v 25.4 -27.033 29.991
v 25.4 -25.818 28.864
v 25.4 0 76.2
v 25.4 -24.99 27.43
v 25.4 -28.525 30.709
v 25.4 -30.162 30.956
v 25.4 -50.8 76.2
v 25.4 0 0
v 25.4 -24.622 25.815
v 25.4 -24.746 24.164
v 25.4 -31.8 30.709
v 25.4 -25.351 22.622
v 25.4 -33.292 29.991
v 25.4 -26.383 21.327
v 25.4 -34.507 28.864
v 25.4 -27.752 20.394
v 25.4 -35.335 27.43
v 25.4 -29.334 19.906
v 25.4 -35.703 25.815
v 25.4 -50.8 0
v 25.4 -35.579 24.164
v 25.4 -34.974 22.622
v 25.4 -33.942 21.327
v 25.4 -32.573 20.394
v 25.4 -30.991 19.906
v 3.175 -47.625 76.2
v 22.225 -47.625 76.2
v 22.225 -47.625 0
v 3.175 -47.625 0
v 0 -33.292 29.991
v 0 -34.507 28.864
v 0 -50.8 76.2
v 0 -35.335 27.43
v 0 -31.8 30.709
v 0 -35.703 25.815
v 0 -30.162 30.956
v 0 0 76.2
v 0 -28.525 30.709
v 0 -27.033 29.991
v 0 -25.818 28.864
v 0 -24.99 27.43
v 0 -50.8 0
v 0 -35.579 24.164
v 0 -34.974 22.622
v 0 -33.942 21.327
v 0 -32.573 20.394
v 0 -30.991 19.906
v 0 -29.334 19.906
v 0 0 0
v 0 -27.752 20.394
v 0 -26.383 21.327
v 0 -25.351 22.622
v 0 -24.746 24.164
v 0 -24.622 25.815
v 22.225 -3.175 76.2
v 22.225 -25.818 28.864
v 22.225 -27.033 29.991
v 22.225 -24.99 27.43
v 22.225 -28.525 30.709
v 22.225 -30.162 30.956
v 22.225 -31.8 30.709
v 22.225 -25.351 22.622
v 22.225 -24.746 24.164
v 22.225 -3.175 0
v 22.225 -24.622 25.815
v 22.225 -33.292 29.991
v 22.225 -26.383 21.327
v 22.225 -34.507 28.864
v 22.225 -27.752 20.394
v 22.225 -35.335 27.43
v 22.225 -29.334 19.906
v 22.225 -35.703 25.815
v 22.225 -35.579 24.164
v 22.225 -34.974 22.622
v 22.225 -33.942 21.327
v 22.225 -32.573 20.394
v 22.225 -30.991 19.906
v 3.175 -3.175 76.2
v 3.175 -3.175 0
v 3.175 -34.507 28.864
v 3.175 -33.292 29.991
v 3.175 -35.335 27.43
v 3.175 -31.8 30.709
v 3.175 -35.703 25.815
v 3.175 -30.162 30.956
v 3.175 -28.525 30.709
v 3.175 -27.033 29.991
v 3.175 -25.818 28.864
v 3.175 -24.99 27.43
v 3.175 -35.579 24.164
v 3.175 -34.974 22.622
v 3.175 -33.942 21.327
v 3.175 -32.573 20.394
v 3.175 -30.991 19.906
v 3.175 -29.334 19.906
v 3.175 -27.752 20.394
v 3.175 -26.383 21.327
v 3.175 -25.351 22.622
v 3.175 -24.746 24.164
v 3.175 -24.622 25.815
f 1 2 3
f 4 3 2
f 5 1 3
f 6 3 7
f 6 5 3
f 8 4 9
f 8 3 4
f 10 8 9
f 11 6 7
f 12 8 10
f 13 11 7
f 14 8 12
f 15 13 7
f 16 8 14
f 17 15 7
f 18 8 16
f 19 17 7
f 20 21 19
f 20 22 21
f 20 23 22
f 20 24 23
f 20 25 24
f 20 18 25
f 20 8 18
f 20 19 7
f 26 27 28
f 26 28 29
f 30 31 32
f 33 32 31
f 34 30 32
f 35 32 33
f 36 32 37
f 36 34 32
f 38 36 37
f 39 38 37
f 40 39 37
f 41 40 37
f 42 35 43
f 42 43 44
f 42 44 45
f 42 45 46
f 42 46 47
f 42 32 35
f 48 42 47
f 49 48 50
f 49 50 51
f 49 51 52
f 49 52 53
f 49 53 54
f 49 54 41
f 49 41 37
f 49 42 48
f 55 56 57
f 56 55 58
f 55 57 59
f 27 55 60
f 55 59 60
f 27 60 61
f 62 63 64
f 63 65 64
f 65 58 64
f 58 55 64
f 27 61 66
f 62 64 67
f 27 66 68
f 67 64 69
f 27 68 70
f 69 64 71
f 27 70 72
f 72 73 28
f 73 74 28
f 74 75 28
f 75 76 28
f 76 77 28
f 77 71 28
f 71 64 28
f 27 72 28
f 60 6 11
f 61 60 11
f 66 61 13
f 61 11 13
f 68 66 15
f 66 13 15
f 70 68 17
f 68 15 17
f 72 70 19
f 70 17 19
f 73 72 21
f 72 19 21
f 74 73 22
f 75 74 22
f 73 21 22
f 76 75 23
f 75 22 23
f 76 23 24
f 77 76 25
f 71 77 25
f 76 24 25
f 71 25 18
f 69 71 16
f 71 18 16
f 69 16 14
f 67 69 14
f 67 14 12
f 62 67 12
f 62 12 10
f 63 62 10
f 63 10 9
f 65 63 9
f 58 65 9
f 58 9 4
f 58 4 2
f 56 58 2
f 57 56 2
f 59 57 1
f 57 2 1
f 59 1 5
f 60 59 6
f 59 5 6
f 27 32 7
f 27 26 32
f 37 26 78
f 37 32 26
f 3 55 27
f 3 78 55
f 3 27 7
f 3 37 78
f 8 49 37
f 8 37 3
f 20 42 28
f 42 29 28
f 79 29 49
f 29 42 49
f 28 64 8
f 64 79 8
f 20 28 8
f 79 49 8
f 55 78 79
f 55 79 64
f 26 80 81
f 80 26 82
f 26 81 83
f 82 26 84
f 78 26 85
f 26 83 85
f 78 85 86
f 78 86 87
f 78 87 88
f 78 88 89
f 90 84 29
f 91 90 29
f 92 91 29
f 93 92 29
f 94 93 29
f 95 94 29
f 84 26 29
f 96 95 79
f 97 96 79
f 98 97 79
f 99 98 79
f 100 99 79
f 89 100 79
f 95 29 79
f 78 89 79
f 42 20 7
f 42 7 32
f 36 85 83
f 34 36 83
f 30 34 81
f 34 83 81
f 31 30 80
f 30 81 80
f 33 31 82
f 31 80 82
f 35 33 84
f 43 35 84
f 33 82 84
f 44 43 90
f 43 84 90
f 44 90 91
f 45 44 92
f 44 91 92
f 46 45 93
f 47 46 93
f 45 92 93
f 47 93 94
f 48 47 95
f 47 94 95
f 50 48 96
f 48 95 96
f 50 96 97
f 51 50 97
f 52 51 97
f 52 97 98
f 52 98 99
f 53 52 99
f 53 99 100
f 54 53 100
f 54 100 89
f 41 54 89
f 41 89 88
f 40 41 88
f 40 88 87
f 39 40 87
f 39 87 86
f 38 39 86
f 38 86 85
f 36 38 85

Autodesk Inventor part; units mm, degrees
ref_plane "YZ Plane" through (0, 0, 0) normal (1, 0, 0) x (0, 1, 0)
ref_plane "XZ Plane" through (0, 0, 0) normal (0, 1, 0) x (-1, 0, 0)
ref_plane "XY Plane" through (0, 0, 0) normal (0, 0, 1) x (1, 0, 0)
sketch "Sketch1" plane through (0, 0, 0) normal (0, 0, 1) x (1, 0, 0)
  line L0 (0, 0) -> (25.4, 0)
  line L1 (25.4, 0) -> (25.4, -50.8)
  line L2 (25.4, -50.8) -> (0, -50.8)
  line L3 (0, -50.8) -> (0, 0)
  line L4 (3.175, -3.175) -> (22.225, -3.175)
  line L5 (22.225, -3.175) -> (22.225, -47.625)
  line L6 (22.225, -47.625) -> (3.175, -47.625)
  line L7 (3.175, -47.625) -> (3.175, -3.175)
  dimension "d0" = 25.4
  dimension "d1" = 50.8
  dimension "d2" = 19.05
  dimension "d3" = 44.45
  dimension "d4" = 3.175
  dimension "d5" = 3.175
extrude "Extrusion1" add sketch "Sketch1" along normal blind 76.2
sketch "Sketch2" plane through (0, -50.8, 0) normal (-1, 0, 0) x (0, 0, 1)
  line L0 (0, 0) -> (0, 50.8) projected
  line L1 (0, 0) -> (76.2, 0) projected
  point P0 (25.4, 20.6375)
  dimension "d8" = 20.6375
  dimension "d9" = 25.4
hole "Hole1" at (0, -30.1625, 25.4) direction (1, 0, 0) diameter 11.1125 end through all
properties part number "axle support 2x1" material "Aluminum 6061"
